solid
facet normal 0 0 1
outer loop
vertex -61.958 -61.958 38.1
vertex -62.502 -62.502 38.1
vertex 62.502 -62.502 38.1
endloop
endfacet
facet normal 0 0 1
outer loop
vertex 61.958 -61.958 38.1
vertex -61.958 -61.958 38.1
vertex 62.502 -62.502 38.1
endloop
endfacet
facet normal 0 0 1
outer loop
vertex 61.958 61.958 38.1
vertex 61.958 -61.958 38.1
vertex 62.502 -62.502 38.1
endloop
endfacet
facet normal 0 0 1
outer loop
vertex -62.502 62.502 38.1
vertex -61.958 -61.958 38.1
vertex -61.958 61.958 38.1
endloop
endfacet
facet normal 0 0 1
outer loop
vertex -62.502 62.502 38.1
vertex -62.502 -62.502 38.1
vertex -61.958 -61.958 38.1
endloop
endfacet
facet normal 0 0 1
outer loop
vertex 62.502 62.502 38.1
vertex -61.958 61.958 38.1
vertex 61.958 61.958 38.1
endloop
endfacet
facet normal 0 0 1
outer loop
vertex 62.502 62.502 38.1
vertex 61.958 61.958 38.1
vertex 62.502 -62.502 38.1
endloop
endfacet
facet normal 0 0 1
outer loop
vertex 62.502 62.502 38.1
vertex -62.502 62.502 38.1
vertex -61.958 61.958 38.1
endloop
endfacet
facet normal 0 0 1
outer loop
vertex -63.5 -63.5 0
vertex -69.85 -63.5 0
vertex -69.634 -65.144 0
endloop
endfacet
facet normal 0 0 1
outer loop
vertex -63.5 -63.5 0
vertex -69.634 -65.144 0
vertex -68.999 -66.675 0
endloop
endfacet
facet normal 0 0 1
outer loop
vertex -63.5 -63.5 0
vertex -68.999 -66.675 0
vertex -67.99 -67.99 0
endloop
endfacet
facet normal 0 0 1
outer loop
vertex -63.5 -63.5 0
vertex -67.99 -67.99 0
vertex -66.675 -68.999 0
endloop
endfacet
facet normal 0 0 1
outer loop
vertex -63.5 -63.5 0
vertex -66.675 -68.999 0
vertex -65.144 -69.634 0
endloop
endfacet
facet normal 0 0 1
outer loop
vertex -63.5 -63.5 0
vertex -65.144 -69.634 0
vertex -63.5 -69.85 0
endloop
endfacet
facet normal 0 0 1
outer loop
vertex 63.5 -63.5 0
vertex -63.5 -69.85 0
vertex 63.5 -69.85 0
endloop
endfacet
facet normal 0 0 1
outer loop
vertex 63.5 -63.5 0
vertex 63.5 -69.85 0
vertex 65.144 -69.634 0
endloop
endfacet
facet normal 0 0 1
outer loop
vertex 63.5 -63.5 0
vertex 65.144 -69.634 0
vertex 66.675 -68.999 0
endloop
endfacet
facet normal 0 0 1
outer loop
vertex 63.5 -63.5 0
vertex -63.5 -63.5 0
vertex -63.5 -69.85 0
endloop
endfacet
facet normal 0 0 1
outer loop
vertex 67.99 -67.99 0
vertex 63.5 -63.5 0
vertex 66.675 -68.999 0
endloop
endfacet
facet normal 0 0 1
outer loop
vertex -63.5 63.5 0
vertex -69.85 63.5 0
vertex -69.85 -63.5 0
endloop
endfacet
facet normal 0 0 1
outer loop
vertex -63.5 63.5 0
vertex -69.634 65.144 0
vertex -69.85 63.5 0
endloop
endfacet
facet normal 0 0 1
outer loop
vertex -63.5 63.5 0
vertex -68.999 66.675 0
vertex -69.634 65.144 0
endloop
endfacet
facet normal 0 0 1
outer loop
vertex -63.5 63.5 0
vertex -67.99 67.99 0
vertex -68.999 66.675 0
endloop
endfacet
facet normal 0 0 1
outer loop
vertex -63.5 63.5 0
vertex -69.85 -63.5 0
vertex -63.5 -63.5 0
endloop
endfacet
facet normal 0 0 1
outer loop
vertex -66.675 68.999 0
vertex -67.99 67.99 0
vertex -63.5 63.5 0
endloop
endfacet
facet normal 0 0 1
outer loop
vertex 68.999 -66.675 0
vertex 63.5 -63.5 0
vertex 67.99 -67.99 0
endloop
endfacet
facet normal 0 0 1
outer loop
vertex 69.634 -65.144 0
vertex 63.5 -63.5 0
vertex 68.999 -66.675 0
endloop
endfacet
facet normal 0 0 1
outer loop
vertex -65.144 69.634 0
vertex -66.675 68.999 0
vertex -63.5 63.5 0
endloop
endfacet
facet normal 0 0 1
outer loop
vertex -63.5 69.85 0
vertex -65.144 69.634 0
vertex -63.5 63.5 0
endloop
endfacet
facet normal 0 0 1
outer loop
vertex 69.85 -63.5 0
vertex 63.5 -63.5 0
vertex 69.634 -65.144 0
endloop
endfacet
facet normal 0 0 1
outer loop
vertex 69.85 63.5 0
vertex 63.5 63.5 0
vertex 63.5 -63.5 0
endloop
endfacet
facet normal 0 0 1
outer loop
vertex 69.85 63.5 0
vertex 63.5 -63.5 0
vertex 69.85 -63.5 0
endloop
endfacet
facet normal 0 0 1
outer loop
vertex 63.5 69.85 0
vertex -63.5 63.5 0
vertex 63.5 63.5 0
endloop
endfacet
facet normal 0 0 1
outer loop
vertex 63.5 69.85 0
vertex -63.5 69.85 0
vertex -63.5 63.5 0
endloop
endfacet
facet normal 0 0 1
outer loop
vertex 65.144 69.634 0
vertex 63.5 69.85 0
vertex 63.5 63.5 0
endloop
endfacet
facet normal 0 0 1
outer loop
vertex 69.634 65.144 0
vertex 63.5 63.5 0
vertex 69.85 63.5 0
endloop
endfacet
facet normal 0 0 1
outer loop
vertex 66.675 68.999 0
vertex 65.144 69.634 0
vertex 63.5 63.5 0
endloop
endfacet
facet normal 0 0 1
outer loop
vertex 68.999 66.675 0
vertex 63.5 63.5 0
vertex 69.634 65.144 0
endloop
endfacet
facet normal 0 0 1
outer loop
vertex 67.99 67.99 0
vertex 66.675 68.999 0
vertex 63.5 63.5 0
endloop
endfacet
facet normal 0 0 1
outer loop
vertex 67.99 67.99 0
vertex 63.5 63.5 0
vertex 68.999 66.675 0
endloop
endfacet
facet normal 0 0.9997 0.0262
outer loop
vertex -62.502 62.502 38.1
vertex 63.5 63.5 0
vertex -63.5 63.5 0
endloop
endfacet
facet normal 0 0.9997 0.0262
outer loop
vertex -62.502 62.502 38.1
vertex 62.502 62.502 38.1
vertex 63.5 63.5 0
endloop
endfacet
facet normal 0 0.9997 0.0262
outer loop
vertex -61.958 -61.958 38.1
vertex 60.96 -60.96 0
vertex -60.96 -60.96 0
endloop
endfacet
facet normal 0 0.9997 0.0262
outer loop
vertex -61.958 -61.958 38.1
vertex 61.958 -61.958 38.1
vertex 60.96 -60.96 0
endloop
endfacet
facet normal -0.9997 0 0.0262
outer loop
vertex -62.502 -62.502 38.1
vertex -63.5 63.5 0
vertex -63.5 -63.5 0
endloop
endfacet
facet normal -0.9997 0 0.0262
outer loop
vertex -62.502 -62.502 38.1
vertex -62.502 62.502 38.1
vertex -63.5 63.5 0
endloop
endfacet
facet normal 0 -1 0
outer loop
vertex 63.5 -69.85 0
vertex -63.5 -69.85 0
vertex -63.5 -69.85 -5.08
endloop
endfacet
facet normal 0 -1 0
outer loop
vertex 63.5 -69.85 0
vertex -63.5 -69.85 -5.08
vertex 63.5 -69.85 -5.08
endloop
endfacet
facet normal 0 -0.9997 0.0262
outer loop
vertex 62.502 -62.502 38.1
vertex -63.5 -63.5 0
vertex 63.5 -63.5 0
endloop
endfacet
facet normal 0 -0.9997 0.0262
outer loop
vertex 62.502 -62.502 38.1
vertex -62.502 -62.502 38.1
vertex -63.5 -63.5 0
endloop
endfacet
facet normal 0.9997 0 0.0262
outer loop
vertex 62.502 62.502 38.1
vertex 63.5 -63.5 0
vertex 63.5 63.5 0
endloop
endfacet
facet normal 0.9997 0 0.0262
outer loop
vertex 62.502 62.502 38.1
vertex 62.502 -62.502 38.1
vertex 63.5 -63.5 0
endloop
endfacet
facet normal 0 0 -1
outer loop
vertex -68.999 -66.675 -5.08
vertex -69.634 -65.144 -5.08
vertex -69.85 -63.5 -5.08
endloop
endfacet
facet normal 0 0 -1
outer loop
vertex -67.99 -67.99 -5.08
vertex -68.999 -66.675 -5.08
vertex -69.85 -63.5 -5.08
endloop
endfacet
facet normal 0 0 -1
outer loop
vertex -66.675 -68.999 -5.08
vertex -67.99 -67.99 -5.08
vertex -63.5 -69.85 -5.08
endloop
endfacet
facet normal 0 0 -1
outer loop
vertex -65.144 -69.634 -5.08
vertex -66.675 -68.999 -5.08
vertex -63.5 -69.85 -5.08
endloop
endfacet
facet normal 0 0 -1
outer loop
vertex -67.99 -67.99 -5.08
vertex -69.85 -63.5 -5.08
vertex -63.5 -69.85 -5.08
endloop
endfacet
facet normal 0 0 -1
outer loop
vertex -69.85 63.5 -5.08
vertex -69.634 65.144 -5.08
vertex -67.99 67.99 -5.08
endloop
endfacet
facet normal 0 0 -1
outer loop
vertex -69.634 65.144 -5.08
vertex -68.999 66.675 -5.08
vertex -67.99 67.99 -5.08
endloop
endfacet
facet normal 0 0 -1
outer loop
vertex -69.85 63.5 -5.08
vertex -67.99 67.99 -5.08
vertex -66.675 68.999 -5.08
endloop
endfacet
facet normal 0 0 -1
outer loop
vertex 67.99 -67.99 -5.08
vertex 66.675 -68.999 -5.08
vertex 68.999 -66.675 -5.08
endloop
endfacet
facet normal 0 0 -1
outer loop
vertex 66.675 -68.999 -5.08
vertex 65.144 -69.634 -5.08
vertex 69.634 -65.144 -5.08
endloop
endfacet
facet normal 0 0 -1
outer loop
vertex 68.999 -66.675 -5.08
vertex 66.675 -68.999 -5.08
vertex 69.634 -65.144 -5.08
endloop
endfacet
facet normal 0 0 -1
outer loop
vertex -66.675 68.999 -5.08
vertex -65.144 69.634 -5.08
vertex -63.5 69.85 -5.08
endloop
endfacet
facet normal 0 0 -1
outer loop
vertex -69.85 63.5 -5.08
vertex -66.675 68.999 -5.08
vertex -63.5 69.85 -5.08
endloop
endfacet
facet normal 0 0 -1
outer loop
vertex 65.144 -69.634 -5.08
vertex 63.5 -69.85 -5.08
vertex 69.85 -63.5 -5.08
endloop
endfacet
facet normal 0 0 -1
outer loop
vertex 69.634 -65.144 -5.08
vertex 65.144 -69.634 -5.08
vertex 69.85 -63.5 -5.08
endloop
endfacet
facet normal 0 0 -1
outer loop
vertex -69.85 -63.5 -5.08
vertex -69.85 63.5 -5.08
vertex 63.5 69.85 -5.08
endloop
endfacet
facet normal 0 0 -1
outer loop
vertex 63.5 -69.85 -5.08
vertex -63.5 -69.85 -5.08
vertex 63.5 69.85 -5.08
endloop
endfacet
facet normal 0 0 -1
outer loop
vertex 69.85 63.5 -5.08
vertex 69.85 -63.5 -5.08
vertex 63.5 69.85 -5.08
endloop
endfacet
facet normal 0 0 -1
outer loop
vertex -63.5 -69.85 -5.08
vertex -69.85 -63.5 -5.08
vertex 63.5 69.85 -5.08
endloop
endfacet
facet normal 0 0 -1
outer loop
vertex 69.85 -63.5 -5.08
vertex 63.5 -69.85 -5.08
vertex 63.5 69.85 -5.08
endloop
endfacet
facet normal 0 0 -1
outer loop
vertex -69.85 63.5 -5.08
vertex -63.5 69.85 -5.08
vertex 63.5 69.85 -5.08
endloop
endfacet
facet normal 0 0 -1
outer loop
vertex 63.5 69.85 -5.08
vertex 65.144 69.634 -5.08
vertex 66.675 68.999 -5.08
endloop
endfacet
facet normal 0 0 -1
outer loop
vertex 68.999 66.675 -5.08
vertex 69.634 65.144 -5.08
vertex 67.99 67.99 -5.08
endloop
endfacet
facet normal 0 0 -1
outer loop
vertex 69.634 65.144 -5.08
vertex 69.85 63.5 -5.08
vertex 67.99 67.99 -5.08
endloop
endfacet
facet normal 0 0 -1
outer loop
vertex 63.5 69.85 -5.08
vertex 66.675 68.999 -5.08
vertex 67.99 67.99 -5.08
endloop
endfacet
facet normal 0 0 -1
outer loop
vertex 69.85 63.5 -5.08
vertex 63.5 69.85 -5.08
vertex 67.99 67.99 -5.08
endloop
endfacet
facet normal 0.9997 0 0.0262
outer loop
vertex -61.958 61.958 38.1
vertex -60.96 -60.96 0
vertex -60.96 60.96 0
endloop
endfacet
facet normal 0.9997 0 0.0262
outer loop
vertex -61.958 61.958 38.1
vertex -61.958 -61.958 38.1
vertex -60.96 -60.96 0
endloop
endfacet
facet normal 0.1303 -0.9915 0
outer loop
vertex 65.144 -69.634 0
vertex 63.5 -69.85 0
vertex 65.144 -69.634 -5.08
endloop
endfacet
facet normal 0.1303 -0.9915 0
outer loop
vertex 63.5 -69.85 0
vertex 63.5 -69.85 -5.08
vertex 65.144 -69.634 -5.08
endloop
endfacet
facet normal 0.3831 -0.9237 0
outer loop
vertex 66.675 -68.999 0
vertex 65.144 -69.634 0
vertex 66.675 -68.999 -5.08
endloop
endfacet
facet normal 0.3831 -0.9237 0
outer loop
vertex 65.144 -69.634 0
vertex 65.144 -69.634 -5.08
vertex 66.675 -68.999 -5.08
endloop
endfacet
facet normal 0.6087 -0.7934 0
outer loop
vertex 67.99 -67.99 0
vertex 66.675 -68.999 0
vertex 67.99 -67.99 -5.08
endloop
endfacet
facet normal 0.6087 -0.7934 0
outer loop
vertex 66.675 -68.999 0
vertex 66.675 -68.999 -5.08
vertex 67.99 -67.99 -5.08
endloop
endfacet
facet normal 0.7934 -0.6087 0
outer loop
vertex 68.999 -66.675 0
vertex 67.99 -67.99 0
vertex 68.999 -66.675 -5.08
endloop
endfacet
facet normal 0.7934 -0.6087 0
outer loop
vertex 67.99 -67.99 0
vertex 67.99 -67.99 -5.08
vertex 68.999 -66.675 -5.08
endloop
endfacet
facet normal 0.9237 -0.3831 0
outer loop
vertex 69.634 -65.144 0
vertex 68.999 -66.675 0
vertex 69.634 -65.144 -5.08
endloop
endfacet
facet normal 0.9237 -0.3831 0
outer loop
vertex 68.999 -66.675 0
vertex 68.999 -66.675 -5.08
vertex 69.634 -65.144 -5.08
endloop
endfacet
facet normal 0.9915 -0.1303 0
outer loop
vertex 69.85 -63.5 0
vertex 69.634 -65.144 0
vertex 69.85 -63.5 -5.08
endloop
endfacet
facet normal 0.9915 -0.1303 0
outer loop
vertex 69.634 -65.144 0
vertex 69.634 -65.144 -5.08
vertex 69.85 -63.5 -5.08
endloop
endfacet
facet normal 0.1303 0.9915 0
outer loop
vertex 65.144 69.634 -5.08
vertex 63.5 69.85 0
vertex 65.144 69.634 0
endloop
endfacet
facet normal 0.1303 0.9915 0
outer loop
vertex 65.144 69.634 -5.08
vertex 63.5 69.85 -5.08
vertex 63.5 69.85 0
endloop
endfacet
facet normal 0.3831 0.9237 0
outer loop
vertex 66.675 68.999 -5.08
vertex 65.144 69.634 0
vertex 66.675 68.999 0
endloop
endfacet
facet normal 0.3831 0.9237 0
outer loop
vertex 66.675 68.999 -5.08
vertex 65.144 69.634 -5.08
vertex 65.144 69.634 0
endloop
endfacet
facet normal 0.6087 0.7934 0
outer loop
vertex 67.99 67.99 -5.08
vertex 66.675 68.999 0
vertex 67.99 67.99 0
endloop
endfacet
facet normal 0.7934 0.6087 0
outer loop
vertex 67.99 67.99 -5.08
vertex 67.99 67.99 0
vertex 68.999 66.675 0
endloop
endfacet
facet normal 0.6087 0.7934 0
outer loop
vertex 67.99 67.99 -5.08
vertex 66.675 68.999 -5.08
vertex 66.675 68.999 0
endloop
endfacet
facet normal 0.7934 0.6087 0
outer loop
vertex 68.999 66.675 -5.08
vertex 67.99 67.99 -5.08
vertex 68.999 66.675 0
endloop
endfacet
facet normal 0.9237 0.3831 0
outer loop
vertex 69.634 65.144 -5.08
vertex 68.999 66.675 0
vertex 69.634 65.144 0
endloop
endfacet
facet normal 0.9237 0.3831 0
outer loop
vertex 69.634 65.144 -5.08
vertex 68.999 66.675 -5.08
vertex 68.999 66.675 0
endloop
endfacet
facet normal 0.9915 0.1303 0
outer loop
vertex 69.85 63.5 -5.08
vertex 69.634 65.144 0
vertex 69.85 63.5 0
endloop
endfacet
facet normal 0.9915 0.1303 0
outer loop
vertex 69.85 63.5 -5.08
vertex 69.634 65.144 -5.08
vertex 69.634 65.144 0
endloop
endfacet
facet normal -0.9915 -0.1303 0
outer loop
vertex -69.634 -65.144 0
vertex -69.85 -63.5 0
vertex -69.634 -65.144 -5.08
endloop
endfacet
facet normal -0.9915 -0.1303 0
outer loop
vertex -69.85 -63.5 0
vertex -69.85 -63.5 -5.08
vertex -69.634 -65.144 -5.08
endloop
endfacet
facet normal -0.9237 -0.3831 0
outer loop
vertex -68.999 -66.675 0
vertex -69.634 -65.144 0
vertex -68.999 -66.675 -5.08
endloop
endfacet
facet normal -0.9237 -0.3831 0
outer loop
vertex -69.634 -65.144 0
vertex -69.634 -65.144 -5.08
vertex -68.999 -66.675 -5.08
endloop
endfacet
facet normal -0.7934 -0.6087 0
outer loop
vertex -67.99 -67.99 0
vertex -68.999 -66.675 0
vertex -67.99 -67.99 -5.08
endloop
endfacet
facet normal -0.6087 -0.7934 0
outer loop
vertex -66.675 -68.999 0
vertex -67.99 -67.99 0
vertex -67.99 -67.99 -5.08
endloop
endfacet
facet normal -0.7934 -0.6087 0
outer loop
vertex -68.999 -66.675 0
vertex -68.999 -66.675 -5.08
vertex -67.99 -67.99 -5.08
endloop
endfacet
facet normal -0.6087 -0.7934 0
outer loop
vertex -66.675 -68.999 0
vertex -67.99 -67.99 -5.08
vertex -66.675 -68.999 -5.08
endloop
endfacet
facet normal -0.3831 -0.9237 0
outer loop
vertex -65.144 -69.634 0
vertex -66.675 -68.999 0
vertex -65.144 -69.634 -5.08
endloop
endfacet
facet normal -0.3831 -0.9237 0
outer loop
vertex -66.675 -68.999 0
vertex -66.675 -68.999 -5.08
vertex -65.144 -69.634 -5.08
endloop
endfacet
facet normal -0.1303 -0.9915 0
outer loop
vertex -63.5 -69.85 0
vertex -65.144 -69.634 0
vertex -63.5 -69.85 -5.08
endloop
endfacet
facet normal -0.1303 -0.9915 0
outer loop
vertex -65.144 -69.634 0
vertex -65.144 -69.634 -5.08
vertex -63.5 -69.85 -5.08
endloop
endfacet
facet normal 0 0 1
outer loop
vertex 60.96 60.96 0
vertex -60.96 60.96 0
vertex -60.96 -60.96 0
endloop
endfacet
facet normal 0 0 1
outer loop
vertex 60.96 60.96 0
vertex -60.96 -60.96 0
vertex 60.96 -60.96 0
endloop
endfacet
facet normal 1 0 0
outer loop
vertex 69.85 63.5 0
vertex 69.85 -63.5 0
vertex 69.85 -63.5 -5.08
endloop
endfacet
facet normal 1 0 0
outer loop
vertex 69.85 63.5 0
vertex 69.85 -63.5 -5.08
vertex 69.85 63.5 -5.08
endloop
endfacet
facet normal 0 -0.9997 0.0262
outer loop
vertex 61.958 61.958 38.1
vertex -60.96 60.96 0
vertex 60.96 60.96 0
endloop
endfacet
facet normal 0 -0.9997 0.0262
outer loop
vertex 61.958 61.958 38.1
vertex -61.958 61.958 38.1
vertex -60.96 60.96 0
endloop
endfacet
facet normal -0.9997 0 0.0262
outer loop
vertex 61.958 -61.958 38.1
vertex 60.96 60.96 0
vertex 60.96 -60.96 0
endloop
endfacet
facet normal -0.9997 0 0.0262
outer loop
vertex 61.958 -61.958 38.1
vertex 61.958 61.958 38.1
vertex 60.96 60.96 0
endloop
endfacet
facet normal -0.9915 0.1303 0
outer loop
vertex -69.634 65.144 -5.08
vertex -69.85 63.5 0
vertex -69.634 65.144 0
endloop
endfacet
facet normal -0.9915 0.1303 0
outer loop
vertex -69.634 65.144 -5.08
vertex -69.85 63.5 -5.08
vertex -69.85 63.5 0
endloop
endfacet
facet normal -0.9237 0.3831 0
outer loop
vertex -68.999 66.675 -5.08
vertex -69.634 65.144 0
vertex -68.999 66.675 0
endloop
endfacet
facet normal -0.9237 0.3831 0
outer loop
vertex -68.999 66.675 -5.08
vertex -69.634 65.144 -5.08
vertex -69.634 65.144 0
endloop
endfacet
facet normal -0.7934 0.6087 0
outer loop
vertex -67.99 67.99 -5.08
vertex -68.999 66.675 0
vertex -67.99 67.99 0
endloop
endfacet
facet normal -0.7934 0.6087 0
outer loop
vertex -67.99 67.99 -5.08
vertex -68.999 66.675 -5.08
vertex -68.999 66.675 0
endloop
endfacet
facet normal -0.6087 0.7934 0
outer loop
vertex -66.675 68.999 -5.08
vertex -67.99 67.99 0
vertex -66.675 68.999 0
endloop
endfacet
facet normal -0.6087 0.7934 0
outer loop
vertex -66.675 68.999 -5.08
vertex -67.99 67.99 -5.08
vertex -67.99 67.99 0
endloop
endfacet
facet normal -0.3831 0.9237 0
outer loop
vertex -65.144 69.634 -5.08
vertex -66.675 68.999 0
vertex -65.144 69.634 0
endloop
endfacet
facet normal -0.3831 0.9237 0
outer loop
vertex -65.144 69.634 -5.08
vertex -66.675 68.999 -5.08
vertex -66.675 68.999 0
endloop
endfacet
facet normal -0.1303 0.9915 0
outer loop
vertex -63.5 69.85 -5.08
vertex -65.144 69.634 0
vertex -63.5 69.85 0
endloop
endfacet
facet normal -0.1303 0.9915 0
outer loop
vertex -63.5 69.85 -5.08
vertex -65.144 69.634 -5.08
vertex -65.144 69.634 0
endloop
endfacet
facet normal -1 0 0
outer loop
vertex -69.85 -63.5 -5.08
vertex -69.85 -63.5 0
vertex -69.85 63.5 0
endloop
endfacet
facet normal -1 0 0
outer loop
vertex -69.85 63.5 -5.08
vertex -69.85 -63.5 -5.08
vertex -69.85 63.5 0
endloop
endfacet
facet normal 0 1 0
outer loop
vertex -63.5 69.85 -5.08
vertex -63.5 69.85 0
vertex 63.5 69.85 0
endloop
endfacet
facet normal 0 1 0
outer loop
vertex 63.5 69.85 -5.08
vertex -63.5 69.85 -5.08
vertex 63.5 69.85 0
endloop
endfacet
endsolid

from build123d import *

# Parameters (mm, degrees)
F0_W     = 127
F0_H     = 127
F0_W_2   = 121.92
F0_H_2   = 121.92
F1_DEPTH = 38.1
F1_TAPER = 1.5
F2_W     = 139.7
F2_H     = 139.7
F3_DEPTH = 5.08
F4_R     = 6.35


with BuildPart() as f1:
    # F0 (on Top) → F1 (new body)
    with BuildSketch(Plane.XY):
        Rectangle(F0_W, F0_H)
        Rectangle(F0_W_2, F0_H_2, mode=Mode.SUBTRACT)
    extrude(amount=F1_DEPTH, taper=F1_TAPER)

    # F2 (on Top) → F3 (join)
    with BuildSketch(Plane.XY):
        Rectangle(F2_W, F2_H)
    extrude(amount=-F3_DEPTH)

    # F4
    f4_edges = [f1.edges().sort_by_distance(p)[0] for p in [
        (-69.85, 69.85, -2.54),
        (-69.85, -69.85, -2.54),
        (69.85, -69.85, -2.54),
        (69.85, 69.85, -2.54),
    ]]
    fillet(f4_edges, radius=F4_R)


solid = f1.part
